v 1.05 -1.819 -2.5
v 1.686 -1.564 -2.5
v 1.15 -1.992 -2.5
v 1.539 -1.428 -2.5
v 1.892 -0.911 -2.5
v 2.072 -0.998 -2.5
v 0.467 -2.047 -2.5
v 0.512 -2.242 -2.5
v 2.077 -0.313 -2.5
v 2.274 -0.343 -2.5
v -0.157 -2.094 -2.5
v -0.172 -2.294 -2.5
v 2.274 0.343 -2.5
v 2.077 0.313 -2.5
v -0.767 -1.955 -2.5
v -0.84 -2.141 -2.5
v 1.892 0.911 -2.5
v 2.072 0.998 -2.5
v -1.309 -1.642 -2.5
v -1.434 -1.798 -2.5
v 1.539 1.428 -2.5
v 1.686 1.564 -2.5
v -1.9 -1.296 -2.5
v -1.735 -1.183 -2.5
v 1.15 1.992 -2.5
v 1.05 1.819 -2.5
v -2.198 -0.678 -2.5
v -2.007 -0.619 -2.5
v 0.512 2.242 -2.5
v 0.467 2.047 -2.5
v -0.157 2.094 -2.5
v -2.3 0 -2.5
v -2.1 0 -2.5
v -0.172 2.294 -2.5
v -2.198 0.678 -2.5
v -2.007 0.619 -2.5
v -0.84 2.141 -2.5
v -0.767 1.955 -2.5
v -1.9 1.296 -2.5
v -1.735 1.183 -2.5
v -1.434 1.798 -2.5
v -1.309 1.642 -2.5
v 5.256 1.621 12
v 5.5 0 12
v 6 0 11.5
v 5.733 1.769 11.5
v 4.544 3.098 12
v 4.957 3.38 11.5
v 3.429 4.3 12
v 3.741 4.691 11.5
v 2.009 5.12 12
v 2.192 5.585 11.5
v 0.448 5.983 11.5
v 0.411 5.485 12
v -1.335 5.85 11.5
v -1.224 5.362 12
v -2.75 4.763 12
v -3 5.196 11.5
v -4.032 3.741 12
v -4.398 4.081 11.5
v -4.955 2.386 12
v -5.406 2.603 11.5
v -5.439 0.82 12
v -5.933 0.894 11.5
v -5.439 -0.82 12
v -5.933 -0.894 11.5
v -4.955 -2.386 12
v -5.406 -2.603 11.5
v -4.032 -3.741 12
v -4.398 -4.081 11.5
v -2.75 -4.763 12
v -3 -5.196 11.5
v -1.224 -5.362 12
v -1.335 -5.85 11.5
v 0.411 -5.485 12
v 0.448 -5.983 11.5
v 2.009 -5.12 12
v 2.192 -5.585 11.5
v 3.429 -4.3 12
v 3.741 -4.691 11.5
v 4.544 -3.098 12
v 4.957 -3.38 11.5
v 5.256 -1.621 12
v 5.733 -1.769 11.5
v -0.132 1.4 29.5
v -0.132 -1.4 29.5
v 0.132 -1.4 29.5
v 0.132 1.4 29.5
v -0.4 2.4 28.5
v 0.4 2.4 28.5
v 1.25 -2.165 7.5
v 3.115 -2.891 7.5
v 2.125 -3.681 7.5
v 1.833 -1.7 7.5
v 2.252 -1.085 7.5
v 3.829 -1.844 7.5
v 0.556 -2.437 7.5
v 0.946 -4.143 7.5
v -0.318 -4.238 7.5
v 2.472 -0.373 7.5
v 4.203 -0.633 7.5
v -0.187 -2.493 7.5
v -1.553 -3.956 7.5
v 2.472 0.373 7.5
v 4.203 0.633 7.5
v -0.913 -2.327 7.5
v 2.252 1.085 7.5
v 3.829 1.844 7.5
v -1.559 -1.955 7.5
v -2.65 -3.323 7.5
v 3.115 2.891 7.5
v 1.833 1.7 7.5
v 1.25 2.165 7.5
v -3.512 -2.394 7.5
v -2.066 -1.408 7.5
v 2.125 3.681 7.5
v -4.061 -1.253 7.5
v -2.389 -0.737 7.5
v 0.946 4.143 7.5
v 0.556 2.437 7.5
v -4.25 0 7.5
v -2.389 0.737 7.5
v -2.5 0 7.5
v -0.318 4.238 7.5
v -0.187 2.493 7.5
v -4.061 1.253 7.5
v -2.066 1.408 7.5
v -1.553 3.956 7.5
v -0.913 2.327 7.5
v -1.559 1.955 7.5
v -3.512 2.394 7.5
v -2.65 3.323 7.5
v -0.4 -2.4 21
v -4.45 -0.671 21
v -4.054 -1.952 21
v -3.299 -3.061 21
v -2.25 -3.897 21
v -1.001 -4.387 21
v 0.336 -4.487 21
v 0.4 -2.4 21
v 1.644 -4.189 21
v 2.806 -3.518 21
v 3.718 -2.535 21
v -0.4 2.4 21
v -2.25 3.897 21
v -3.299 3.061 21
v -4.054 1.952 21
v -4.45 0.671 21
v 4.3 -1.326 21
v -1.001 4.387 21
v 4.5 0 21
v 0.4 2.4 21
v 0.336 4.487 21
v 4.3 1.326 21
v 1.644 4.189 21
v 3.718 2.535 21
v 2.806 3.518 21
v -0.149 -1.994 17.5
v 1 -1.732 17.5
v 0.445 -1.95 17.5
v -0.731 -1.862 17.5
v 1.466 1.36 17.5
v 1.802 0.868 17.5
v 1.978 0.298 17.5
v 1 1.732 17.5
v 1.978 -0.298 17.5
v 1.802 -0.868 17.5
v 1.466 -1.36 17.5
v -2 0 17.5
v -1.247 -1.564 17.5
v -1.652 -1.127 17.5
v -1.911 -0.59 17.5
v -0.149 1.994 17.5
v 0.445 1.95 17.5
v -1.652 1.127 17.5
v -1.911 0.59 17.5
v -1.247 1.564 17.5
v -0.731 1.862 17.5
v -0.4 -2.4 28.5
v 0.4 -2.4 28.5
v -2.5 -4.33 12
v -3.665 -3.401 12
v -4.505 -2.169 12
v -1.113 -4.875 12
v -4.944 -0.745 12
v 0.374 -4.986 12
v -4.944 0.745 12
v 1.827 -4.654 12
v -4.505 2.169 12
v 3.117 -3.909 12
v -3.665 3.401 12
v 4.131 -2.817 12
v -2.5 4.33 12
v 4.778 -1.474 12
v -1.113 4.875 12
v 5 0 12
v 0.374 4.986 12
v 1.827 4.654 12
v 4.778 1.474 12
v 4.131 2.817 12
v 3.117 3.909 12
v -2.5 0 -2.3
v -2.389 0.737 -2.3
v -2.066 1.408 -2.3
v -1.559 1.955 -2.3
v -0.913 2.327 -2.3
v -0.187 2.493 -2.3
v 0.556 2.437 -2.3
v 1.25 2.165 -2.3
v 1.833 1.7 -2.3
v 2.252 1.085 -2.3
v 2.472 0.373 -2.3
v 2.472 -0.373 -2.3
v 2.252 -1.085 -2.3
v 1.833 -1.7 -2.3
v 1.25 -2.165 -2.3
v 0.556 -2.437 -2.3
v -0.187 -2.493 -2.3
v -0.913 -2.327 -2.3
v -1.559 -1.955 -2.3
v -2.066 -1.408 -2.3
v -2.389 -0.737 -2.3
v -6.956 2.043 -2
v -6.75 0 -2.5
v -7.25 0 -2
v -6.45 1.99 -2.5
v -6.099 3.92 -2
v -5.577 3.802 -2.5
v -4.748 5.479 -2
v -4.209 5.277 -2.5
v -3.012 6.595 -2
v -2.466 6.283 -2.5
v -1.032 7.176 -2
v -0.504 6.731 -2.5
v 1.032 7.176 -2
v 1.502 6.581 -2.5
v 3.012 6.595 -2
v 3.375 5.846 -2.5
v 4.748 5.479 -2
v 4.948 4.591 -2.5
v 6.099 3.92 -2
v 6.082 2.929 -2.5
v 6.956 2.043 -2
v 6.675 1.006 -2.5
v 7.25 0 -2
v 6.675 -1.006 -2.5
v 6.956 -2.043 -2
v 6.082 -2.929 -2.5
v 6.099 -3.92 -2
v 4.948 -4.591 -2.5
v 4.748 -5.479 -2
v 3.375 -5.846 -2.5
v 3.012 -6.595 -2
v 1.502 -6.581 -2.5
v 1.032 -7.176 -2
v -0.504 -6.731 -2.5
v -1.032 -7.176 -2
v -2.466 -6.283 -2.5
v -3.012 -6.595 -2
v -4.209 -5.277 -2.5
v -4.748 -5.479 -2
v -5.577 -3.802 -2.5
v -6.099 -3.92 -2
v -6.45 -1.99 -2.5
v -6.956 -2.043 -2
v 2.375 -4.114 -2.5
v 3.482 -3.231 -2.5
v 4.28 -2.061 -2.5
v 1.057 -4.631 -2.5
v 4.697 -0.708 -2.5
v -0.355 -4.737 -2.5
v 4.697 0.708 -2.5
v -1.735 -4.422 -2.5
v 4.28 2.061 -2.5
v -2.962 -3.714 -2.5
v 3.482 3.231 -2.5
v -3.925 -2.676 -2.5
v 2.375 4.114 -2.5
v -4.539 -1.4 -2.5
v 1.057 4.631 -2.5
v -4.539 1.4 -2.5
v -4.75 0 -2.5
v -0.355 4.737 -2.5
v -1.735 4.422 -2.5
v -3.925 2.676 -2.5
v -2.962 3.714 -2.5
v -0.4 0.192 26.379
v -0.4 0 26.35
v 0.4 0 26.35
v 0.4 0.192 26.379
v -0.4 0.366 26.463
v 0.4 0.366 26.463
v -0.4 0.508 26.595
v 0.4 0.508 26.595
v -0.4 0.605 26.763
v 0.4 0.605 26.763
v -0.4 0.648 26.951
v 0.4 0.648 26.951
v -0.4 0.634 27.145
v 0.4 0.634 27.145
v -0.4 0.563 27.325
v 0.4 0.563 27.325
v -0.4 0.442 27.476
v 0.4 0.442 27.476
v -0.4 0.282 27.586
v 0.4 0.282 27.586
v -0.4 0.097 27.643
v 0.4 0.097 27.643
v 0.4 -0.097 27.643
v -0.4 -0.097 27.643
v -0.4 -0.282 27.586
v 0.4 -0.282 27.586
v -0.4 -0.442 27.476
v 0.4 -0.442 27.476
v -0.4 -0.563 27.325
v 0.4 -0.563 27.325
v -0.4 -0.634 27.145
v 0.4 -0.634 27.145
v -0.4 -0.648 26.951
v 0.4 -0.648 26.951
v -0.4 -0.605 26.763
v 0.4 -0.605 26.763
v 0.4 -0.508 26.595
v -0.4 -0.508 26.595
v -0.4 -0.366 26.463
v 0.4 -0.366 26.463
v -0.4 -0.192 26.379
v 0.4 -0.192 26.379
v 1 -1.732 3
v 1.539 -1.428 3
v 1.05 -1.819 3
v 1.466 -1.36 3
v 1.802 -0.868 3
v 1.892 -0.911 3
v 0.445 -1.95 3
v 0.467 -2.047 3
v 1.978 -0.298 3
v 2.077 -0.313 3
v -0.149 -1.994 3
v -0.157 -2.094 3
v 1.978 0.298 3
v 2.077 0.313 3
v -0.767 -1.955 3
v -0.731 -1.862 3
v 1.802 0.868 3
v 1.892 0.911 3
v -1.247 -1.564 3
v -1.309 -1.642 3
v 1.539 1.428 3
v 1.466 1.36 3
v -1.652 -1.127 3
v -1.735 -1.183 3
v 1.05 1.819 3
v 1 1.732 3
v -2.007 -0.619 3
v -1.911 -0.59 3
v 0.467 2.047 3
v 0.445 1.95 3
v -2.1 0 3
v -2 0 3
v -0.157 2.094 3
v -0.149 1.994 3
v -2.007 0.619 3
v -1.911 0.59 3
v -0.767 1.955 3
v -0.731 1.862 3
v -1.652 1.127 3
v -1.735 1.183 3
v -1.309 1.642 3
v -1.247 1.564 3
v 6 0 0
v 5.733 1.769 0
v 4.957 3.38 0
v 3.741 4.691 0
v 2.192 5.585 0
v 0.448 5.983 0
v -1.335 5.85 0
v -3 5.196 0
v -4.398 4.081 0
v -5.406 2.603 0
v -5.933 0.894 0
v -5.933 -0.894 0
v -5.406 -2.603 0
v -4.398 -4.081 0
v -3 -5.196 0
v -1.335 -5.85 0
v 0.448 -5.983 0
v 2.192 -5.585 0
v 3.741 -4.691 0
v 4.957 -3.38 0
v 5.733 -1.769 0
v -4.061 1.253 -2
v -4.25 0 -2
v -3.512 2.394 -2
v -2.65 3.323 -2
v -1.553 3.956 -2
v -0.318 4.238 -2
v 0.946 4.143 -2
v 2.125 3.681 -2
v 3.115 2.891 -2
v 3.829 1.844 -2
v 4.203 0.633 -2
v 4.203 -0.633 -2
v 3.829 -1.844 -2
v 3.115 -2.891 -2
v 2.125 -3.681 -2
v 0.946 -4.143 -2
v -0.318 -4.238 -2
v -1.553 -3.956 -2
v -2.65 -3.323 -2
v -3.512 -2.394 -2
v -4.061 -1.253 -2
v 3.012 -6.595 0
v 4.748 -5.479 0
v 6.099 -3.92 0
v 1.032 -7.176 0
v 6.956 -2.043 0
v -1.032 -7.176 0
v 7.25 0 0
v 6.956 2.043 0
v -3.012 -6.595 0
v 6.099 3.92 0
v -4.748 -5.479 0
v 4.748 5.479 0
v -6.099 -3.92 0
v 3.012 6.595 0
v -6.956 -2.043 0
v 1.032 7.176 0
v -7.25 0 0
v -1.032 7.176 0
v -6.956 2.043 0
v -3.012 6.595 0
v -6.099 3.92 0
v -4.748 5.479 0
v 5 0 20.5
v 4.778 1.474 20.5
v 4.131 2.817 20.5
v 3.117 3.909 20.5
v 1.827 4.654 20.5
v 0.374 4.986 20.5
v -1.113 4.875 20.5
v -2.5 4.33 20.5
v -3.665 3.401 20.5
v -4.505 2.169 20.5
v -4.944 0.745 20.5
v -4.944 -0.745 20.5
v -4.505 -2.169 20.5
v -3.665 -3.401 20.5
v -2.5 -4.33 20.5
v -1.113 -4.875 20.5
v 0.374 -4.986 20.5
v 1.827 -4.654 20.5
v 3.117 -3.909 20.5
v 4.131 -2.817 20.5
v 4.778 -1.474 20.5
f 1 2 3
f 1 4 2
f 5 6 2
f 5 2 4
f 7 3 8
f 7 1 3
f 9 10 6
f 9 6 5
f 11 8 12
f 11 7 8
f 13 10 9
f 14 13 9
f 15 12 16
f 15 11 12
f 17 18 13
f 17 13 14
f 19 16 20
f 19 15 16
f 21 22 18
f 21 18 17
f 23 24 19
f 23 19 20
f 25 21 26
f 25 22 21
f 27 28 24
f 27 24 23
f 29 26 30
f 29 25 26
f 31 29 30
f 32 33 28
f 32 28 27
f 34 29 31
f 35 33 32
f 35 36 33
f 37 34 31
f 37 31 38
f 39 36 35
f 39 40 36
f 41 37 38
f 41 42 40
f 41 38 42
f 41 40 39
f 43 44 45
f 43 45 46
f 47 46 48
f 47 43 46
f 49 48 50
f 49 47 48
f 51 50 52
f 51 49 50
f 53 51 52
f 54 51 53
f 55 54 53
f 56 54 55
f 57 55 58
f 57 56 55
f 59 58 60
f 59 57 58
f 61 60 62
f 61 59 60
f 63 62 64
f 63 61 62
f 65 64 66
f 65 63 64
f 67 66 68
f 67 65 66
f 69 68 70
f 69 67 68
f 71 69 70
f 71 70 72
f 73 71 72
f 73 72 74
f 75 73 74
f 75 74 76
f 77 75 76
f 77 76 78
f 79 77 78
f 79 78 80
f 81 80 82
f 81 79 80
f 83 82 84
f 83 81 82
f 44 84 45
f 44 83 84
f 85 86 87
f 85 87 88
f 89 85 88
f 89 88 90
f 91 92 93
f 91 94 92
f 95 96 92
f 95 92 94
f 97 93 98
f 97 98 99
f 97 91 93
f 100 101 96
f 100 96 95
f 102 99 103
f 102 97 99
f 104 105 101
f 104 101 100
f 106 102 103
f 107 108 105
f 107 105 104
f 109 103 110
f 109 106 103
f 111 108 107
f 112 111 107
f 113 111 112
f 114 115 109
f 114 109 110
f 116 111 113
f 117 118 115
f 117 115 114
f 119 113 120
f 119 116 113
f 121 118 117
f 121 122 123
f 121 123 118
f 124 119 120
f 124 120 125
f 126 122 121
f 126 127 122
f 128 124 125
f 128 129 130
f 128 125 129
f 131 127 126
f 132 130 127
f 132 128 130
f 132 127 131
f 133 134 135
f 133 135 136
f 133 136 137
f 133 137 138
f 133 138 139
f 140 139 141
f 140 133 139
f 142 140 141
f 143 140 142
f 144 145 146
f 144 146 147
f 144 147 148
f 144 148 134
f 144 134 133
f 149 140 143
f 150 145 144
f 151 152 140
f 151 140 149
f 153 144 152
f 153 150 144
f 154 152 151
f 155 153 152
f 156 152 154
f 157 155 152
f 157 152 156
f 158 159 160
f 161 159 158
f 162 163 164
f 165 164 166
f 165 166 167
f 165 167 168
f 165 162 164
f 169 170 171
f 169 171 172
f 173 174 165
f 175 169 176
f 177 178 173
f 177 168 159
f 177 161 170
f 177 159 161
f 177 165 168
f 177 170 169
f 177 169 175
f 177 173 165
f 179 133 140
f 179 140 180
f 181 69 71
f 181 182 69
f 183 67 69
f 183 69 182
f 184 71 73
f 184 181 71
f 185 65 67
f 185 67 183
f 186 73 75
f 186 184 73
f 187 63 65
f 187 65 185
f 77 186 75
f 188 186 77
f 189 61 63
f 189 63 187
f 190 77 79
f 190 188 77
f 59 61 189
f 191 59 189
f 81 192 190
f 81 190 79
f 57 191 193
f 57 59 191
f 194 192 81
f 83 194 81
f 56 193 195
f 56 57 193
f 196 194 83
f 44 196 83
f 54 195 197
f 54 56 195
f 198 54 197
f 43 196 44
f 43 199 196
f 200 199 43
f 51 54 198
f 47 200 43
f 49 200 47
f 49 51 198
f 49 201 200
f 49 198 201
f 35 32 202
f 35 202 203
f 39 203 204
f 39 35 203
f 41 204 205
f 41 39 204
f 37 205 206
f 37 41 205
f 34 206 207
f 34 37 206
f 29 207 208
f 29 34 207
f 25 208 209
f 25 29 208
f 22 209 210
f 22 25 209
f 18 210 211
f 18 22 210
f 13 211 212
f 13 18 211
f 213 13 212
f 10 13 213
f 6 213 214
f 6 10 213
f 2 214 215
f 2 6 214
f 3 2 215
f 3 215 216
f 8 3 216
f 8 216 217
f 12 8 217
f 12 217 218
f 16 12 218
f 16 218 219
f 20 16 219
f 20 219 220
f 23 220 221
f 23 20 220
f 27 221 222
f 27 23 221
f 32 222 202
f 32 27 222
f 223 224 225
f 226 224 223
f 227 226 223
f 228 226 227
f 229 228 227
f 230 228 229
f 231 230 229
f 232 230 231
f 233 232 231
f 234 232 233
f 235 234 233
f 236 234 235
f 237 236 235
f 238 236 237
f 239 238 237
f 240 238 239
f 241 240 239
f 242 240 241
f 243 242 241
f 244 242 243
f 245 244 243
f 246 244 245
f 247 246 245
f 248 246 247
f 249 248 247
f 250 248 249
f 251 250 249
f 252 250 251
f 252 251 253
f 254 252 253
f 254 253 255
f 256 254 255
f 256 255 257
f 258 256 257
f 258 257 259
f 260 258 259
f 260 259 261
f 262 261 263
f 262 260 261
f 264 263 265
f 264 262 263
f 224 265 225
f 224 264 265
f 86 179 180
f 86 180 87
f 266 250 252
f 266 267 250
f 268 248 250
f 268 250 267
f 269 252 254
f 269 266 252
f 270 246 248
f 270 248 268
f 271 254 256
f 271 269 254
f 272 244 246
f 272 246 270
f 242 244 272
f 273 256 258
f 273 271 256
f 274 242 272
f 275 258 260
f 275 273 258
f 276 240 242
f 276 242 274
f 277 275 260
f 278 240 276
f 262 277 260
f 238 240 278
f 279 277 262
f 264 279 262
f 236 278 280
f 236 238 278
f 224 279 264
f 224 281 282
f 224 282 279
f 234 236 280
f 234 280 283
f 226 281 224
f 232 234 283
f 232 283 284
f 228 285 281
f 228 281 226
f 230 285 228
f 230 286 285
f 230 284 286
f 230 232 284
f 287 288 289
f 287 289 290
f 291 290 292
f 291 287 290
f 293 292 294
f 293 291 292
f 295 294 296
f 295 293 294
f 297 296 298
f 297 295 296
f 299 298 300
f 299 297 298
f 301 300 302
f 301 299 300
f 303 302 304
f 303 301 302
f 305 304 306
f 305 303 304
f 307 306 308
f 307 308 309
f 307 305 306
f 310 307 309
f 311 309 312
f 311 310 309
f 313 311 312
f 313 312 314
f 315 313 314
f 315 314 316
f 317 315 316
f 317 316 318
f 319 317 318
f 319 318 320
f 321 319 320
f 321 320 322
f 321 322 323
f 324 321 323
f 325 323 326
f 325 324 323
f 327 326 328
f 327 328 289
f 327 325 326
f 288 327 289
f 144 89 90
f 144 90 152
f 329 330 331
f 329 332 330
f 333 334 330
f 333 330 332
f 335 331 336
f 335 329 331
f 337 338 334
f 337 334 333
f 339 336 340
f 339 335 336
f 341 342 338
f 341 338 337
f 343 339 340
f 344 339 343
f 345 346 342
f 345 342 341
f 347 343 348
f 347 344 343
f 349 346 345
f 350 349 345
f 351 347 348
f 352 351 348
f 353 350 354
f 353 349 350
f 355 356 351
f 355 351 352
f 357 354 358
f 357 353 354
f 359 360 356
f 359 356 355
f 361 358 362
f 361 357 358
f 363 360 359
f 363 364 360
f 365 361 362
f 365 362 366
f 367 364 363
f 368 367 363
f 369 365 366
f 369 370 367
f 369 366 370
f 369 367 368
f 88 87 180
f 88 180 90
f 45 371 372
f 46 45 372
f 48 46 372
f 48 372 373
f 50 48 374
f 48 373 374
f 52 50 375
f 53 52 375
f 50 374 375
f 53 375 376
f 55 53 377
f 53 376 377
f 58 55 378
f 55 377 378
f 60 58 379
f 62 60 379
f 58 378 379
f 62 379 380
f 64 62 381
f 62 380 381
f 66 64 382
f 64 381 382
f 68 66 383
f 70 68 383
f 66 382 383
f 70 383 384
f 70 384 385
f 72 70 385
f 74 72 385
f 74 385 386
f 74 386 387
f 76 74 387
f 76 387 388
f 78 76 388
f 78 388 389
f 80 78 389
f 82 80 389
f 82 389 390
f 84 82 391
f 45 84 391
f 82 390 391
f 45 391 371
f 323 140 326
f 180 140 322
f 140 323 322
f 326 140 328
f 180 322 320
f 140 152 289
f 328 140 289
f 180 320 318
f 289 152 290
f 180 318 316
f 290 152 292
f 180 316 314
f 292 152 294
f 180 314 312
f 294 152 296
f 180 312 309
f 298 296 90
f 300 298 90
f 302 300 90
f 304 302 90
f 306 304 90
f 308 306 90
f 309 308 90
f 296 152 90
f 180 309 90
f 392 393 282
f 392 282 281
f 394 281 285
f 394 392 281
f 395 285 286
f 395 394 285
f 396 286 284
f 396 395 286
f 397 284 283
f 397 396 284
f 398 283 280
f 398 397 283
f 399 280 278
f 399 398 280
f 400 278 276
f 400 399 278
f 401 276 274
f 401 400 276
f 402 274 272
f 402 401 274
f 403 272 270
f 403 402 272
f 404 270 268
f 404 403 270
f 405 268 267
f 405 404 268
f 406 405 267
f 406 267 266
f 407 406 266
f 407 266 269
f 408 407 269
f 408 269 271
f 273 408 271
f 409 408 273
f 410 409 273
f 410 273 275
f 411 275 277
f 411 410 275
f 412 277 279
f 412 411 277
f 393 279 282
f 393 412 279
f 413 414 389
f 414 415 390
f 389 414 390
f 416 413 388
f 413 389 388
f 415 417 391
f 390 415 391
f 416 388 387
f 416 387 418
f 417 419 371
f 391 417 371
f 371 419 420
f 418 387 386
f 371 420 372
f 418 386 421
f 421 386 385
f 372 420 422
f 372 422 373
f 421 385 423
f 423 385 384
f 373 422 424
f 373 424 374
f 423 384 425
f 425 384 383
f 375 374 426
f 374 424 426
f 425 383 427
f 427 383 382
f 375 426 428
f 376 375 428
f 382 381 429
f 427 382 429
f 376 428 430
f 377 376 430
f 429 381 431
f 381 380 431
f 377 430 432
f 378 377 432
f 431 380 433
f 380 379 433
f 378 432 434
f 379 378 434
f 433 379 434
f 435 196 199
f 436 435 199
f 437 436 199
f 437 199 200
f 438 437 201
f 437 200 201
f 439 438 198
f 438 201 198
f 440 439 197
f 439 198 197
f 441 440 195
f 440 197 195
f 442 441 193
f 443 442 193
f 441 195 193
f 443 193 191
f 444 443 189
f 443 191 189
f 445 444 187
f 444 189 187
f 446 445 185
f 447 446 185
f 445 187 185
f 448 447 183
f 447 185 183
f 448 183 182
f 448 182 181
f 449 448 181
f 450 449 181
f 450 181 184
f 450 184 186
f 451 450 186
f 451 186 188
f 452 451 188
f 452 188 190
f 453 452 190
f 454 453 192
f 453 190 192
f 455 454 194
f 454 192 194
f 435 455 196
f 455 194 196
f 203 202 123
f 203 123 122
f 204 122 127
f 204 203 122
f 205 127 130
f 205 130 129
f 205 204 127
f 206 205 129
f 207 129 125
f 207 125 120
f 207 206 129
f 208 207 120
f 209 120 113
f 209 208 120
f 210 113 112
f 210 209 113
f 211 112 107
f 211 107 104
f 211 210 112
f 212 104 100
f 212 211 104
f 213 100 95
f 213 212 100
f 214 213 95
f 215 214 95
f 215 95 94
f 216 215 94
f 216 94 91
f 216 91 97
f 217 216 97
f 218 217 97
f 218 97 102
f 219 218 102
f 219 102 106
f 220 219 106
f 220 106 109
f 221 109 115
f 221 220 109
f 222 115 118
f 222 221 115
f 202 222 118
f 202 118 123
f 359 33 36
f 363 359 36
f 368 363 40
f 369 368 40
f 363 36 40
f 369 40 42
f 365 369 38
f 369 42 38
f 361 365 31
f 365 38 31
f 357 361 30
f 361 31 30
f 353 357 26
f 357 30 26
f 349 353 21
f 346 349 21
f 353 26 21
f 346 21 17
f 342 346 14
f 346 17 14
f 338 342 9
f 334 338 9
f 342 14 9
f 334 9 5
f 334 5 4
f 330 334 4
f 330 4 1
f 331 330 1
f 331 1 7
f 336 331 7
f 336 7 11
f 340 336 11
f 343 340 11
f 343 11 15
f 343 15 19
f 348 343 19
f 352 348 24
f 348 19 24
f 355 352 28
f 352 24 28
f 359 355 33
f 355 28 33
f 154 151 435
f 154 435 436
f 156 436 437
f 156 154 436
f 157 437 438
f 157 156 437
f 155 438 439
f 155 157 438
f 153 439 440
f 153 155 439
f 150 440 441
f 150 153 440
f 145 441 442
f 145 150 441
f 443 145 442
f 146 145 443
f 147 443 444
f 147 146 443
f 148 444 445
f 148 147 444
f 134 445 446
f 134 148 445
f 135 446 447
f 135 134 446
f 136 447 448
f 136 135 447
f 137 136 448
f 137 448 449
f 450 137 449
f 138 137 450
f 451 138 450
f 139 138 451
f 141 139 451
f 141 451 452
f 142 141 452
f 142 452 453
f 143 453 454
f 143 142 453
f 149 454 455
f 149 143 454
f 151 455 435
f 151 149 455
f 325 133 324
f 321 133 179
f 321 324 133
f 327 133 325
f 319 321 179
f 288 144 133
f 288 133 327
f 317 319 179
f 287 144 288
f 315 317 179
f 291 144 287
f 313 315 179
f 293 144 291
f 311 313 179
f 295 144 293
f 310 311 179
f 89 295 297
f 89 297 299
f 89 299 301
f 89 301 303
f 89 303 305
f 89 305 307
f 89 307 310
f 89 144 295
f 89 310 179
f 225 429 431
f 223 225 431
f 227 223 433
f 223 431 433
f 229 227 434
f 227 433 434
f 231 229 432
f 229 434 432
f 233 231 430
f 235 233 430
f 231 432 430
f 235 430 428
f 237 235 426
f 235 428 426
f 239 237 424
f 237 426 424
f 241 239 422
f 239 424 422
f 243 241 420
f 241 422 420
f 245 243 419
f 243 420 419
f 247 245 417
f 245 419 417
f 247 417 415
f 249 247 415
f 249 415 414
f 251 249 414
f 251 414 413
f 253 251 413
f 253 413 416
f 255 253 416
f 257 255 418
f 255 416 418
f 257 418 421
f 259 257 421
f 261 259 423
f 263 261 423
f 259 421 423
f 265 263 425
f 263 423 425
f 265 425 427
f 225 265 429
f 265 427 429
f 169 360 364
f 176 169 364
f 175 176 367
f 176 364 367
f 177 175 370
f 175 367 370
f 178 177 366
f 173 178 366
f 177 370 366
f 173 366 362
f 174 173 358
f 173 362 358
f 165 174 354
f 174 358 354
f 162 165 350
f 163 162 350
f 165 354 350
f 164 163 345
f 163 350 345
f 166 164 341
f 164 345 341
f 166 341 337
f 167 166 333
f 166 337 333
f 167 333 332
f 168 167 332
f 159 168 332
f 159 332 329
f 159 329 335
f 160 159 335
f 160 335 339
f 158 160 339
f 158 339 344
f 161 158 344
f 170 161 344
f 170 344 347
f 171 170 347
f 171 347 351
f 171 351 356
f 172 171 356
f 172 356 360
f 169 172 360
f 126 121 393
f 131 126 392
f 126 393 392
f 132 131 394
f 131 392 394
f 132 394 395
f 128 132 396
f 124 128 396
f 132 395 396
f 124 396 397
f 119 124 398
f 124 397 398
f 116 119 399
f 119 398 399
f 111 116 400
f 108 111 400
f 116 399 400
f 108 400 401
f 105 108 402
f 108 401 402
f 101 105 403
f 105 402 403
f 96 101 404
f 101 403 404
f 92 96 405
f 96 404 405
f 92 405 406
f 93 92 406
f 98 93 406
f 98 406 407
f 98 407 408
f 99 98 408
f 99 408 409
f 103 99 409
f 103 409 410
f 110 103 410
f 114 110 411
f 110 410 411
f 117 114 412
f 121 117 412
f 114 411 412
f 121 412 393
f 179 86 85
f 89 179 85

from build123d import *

# Parameters (mm, degrees)
ESQUISSE1_R             = 6
BOSS_EXTRU_1_DEPTH      = 12
ESQUISSE2_R             = 5
BOSS_EXTRU_2_DEPTH      = 9
ESQUISSE3_R             = 7.25
BOSS_EXTRU_3_DEPTH      = 2.5
ESQUISSE4_R             = 2
ENL_V_MAT_EXTRU_1_DEPTH = 20
ESQUISSE9_R             = 2.1
ENL_V_MAT_EXTRU_4_DEPTH = 5.5
ESQUISSE6_R             = 4.25
ESQUISSE6_R_2           = 2.5
ENL_V_MAT_EXTRU_2_DEPTH = 10
CHANFREIN1_SIZE         = 0.5
CHANFREIN2_SIZE         = 0.2
BOSS_EXTRU_4_DEPTH      = 0.4
BOSS_EXTRU_4_DEPTH_BACK = 0.4
ESQUISSE8_R             = 0.65
CHANFREIN3_SIZE         = 1
CHANFREIN3_SIZE2        = 0.267949192
CHANFREIN4_SIZE         = 1
CHANFREIN4_SIZE2        = 0.267949192


with BuildPart() as part:
    # Esquisse1 → Boss.-Extru.1 (new body)
    with BuildSketch(Plane.XY):
        Circle(ESQUISSE1_R)
    extrude(amount=BOSS_EXTRU_1_DEPTH)

    # Esquisse2 → Boss.-Extru.2 (add)
    with BuildSketch(Plane.XY.offset(12)):
        Circle(ESQUISSE2_R)
    extrude(amount=BOSS_EXTRU_2_DEPTH)

    # Esquisse3 → Boss.-Extru.3 (add)
    with BuildSketch(Plane(origin=(0, 0, 0), x_dir=(-1, 0, 0), z_dir=(0, 0, -1))):
        Circle(ESQUISSE3_R)
    extrude(amount=BOSS_EXTRU_3_DEPTH)

    # Esquisse4 → Enlèv. mat.-Extru.1 (cut)
    with BuildSketch(Plane(origin=(0, 0, -2.5), x_dir=(-1, 0, 0), z_dir=(0, 0, -1))):
        Circle(ESQUISSE4_R)
    extrude(amount=-ENL_V_MAT_EXTRU_1_DEPTH, mode=Mode.SUBTRACT)

    # Esquisse9 → Enlèv. mat.-Extru.4 (cut)
    with BuildSketch(Plane(origin=(0, 0, -2.5), x_dir=(-1, 0, 0), z_dir=(0, 0, -1))):
        Circle(ESQUISSE9_R)
    extrude(amount=-ENL_V_MAT_EXTRU_4_DEPTH, mode=Mode.SUBTRACT)

    # Esquisse6 → Enlèv. mat.-Extru.2 (cut)
    with BuildSketch(Plane(origin=(0, 0, -2.5), x_dir=(-1, 0, 0), z_dir=(0, 0, -1))):
        Circle(ESQUISSE6_R)
        Circle(ESQUISSE6_R_2, mode=Mode.SUBTRACT)
    extrude(amount=-ENL_V_MAT_EXTRU_2_DEPTH, mode=Mode.SUBTRACT)

    # Chanfrein1
    chanfrein1_edges = [part.edges().sort_by_distance(p)[0] for p in [
        (4.25, 0, -2.5),
        (-6, 0, 12),
        (-5, 0, 21),
        (7.25, 0, -2.5),
    ]]
    chamfer(chanfrein1_edges, length=CHANFREIN1_SIZE)

    # Chanfrein2
    chanfrein2_edges = [part.edges().sort_by_distance(p)[0] for p in [
        (2.5, 0, -2.5),
    ]]
    chamfer(chanfrein2_edges, length=CHANFREIN2_SIZE)

    # Esquisse8 → Boss.-Extru.4 (add, two sides: drawn at the far end of the back side and taken through both)
    with BuildSketch(Plane(origin=(0, 0, 0), x_dir=(0, 0, -1), z_dir=(1, 0, 0)).offset(-BOSS_EXTRU_4_DEPTH_BACK)):
        Polygon((-21, -2.4), (-28.5, -2.4), (-29.5, -1.4), (-29.5, 1.4), (-28.5, 2.4), (-21, 2.4), align=None)
        with Locations((-27, 0)):
            Circle(ESQUISSE8_R, mode=Mode.SUBTRACT)
    extrude(amount=BOSS_EXTRU_4_DEPTH + BOSS_EXTRU_4_DEPTH_BACK)

    # Chanfrein3
    chanfrein3_edges = [part.edges().sort_by_distance(p)[0] for p in [
        (0.4, 0, 29.5),
    ]]
    chanfrein3_side = [part.faces().sort_by_distance(p)[0] for p in [
        (0.4, 0, 25.087820443),
    ]]
    chamfer(chanfrein3_edges, length=CHANFREIN3_SIZE, length2=CHANFREIN3_SIZE2, reference=chanfrein3_side[0])

    # Chanfrein4
    chanfrein4_edges = [part.edges().sort_by_distance(p)[0] for p in [
        (-0.4, 0, 29.5),
    ]]
    chanfrein4_side = [part.faces().sort_by_distance(p)[0] for p in [
        (-0.4, 0, 25.087820443),
    ]]
    chamfer(chanfrein4_edges, length=CHANFREIN4_SIZE, length2=CHANFREIN4_SIZE2, reference=chanfrein4_side[0])


solid = part.part
